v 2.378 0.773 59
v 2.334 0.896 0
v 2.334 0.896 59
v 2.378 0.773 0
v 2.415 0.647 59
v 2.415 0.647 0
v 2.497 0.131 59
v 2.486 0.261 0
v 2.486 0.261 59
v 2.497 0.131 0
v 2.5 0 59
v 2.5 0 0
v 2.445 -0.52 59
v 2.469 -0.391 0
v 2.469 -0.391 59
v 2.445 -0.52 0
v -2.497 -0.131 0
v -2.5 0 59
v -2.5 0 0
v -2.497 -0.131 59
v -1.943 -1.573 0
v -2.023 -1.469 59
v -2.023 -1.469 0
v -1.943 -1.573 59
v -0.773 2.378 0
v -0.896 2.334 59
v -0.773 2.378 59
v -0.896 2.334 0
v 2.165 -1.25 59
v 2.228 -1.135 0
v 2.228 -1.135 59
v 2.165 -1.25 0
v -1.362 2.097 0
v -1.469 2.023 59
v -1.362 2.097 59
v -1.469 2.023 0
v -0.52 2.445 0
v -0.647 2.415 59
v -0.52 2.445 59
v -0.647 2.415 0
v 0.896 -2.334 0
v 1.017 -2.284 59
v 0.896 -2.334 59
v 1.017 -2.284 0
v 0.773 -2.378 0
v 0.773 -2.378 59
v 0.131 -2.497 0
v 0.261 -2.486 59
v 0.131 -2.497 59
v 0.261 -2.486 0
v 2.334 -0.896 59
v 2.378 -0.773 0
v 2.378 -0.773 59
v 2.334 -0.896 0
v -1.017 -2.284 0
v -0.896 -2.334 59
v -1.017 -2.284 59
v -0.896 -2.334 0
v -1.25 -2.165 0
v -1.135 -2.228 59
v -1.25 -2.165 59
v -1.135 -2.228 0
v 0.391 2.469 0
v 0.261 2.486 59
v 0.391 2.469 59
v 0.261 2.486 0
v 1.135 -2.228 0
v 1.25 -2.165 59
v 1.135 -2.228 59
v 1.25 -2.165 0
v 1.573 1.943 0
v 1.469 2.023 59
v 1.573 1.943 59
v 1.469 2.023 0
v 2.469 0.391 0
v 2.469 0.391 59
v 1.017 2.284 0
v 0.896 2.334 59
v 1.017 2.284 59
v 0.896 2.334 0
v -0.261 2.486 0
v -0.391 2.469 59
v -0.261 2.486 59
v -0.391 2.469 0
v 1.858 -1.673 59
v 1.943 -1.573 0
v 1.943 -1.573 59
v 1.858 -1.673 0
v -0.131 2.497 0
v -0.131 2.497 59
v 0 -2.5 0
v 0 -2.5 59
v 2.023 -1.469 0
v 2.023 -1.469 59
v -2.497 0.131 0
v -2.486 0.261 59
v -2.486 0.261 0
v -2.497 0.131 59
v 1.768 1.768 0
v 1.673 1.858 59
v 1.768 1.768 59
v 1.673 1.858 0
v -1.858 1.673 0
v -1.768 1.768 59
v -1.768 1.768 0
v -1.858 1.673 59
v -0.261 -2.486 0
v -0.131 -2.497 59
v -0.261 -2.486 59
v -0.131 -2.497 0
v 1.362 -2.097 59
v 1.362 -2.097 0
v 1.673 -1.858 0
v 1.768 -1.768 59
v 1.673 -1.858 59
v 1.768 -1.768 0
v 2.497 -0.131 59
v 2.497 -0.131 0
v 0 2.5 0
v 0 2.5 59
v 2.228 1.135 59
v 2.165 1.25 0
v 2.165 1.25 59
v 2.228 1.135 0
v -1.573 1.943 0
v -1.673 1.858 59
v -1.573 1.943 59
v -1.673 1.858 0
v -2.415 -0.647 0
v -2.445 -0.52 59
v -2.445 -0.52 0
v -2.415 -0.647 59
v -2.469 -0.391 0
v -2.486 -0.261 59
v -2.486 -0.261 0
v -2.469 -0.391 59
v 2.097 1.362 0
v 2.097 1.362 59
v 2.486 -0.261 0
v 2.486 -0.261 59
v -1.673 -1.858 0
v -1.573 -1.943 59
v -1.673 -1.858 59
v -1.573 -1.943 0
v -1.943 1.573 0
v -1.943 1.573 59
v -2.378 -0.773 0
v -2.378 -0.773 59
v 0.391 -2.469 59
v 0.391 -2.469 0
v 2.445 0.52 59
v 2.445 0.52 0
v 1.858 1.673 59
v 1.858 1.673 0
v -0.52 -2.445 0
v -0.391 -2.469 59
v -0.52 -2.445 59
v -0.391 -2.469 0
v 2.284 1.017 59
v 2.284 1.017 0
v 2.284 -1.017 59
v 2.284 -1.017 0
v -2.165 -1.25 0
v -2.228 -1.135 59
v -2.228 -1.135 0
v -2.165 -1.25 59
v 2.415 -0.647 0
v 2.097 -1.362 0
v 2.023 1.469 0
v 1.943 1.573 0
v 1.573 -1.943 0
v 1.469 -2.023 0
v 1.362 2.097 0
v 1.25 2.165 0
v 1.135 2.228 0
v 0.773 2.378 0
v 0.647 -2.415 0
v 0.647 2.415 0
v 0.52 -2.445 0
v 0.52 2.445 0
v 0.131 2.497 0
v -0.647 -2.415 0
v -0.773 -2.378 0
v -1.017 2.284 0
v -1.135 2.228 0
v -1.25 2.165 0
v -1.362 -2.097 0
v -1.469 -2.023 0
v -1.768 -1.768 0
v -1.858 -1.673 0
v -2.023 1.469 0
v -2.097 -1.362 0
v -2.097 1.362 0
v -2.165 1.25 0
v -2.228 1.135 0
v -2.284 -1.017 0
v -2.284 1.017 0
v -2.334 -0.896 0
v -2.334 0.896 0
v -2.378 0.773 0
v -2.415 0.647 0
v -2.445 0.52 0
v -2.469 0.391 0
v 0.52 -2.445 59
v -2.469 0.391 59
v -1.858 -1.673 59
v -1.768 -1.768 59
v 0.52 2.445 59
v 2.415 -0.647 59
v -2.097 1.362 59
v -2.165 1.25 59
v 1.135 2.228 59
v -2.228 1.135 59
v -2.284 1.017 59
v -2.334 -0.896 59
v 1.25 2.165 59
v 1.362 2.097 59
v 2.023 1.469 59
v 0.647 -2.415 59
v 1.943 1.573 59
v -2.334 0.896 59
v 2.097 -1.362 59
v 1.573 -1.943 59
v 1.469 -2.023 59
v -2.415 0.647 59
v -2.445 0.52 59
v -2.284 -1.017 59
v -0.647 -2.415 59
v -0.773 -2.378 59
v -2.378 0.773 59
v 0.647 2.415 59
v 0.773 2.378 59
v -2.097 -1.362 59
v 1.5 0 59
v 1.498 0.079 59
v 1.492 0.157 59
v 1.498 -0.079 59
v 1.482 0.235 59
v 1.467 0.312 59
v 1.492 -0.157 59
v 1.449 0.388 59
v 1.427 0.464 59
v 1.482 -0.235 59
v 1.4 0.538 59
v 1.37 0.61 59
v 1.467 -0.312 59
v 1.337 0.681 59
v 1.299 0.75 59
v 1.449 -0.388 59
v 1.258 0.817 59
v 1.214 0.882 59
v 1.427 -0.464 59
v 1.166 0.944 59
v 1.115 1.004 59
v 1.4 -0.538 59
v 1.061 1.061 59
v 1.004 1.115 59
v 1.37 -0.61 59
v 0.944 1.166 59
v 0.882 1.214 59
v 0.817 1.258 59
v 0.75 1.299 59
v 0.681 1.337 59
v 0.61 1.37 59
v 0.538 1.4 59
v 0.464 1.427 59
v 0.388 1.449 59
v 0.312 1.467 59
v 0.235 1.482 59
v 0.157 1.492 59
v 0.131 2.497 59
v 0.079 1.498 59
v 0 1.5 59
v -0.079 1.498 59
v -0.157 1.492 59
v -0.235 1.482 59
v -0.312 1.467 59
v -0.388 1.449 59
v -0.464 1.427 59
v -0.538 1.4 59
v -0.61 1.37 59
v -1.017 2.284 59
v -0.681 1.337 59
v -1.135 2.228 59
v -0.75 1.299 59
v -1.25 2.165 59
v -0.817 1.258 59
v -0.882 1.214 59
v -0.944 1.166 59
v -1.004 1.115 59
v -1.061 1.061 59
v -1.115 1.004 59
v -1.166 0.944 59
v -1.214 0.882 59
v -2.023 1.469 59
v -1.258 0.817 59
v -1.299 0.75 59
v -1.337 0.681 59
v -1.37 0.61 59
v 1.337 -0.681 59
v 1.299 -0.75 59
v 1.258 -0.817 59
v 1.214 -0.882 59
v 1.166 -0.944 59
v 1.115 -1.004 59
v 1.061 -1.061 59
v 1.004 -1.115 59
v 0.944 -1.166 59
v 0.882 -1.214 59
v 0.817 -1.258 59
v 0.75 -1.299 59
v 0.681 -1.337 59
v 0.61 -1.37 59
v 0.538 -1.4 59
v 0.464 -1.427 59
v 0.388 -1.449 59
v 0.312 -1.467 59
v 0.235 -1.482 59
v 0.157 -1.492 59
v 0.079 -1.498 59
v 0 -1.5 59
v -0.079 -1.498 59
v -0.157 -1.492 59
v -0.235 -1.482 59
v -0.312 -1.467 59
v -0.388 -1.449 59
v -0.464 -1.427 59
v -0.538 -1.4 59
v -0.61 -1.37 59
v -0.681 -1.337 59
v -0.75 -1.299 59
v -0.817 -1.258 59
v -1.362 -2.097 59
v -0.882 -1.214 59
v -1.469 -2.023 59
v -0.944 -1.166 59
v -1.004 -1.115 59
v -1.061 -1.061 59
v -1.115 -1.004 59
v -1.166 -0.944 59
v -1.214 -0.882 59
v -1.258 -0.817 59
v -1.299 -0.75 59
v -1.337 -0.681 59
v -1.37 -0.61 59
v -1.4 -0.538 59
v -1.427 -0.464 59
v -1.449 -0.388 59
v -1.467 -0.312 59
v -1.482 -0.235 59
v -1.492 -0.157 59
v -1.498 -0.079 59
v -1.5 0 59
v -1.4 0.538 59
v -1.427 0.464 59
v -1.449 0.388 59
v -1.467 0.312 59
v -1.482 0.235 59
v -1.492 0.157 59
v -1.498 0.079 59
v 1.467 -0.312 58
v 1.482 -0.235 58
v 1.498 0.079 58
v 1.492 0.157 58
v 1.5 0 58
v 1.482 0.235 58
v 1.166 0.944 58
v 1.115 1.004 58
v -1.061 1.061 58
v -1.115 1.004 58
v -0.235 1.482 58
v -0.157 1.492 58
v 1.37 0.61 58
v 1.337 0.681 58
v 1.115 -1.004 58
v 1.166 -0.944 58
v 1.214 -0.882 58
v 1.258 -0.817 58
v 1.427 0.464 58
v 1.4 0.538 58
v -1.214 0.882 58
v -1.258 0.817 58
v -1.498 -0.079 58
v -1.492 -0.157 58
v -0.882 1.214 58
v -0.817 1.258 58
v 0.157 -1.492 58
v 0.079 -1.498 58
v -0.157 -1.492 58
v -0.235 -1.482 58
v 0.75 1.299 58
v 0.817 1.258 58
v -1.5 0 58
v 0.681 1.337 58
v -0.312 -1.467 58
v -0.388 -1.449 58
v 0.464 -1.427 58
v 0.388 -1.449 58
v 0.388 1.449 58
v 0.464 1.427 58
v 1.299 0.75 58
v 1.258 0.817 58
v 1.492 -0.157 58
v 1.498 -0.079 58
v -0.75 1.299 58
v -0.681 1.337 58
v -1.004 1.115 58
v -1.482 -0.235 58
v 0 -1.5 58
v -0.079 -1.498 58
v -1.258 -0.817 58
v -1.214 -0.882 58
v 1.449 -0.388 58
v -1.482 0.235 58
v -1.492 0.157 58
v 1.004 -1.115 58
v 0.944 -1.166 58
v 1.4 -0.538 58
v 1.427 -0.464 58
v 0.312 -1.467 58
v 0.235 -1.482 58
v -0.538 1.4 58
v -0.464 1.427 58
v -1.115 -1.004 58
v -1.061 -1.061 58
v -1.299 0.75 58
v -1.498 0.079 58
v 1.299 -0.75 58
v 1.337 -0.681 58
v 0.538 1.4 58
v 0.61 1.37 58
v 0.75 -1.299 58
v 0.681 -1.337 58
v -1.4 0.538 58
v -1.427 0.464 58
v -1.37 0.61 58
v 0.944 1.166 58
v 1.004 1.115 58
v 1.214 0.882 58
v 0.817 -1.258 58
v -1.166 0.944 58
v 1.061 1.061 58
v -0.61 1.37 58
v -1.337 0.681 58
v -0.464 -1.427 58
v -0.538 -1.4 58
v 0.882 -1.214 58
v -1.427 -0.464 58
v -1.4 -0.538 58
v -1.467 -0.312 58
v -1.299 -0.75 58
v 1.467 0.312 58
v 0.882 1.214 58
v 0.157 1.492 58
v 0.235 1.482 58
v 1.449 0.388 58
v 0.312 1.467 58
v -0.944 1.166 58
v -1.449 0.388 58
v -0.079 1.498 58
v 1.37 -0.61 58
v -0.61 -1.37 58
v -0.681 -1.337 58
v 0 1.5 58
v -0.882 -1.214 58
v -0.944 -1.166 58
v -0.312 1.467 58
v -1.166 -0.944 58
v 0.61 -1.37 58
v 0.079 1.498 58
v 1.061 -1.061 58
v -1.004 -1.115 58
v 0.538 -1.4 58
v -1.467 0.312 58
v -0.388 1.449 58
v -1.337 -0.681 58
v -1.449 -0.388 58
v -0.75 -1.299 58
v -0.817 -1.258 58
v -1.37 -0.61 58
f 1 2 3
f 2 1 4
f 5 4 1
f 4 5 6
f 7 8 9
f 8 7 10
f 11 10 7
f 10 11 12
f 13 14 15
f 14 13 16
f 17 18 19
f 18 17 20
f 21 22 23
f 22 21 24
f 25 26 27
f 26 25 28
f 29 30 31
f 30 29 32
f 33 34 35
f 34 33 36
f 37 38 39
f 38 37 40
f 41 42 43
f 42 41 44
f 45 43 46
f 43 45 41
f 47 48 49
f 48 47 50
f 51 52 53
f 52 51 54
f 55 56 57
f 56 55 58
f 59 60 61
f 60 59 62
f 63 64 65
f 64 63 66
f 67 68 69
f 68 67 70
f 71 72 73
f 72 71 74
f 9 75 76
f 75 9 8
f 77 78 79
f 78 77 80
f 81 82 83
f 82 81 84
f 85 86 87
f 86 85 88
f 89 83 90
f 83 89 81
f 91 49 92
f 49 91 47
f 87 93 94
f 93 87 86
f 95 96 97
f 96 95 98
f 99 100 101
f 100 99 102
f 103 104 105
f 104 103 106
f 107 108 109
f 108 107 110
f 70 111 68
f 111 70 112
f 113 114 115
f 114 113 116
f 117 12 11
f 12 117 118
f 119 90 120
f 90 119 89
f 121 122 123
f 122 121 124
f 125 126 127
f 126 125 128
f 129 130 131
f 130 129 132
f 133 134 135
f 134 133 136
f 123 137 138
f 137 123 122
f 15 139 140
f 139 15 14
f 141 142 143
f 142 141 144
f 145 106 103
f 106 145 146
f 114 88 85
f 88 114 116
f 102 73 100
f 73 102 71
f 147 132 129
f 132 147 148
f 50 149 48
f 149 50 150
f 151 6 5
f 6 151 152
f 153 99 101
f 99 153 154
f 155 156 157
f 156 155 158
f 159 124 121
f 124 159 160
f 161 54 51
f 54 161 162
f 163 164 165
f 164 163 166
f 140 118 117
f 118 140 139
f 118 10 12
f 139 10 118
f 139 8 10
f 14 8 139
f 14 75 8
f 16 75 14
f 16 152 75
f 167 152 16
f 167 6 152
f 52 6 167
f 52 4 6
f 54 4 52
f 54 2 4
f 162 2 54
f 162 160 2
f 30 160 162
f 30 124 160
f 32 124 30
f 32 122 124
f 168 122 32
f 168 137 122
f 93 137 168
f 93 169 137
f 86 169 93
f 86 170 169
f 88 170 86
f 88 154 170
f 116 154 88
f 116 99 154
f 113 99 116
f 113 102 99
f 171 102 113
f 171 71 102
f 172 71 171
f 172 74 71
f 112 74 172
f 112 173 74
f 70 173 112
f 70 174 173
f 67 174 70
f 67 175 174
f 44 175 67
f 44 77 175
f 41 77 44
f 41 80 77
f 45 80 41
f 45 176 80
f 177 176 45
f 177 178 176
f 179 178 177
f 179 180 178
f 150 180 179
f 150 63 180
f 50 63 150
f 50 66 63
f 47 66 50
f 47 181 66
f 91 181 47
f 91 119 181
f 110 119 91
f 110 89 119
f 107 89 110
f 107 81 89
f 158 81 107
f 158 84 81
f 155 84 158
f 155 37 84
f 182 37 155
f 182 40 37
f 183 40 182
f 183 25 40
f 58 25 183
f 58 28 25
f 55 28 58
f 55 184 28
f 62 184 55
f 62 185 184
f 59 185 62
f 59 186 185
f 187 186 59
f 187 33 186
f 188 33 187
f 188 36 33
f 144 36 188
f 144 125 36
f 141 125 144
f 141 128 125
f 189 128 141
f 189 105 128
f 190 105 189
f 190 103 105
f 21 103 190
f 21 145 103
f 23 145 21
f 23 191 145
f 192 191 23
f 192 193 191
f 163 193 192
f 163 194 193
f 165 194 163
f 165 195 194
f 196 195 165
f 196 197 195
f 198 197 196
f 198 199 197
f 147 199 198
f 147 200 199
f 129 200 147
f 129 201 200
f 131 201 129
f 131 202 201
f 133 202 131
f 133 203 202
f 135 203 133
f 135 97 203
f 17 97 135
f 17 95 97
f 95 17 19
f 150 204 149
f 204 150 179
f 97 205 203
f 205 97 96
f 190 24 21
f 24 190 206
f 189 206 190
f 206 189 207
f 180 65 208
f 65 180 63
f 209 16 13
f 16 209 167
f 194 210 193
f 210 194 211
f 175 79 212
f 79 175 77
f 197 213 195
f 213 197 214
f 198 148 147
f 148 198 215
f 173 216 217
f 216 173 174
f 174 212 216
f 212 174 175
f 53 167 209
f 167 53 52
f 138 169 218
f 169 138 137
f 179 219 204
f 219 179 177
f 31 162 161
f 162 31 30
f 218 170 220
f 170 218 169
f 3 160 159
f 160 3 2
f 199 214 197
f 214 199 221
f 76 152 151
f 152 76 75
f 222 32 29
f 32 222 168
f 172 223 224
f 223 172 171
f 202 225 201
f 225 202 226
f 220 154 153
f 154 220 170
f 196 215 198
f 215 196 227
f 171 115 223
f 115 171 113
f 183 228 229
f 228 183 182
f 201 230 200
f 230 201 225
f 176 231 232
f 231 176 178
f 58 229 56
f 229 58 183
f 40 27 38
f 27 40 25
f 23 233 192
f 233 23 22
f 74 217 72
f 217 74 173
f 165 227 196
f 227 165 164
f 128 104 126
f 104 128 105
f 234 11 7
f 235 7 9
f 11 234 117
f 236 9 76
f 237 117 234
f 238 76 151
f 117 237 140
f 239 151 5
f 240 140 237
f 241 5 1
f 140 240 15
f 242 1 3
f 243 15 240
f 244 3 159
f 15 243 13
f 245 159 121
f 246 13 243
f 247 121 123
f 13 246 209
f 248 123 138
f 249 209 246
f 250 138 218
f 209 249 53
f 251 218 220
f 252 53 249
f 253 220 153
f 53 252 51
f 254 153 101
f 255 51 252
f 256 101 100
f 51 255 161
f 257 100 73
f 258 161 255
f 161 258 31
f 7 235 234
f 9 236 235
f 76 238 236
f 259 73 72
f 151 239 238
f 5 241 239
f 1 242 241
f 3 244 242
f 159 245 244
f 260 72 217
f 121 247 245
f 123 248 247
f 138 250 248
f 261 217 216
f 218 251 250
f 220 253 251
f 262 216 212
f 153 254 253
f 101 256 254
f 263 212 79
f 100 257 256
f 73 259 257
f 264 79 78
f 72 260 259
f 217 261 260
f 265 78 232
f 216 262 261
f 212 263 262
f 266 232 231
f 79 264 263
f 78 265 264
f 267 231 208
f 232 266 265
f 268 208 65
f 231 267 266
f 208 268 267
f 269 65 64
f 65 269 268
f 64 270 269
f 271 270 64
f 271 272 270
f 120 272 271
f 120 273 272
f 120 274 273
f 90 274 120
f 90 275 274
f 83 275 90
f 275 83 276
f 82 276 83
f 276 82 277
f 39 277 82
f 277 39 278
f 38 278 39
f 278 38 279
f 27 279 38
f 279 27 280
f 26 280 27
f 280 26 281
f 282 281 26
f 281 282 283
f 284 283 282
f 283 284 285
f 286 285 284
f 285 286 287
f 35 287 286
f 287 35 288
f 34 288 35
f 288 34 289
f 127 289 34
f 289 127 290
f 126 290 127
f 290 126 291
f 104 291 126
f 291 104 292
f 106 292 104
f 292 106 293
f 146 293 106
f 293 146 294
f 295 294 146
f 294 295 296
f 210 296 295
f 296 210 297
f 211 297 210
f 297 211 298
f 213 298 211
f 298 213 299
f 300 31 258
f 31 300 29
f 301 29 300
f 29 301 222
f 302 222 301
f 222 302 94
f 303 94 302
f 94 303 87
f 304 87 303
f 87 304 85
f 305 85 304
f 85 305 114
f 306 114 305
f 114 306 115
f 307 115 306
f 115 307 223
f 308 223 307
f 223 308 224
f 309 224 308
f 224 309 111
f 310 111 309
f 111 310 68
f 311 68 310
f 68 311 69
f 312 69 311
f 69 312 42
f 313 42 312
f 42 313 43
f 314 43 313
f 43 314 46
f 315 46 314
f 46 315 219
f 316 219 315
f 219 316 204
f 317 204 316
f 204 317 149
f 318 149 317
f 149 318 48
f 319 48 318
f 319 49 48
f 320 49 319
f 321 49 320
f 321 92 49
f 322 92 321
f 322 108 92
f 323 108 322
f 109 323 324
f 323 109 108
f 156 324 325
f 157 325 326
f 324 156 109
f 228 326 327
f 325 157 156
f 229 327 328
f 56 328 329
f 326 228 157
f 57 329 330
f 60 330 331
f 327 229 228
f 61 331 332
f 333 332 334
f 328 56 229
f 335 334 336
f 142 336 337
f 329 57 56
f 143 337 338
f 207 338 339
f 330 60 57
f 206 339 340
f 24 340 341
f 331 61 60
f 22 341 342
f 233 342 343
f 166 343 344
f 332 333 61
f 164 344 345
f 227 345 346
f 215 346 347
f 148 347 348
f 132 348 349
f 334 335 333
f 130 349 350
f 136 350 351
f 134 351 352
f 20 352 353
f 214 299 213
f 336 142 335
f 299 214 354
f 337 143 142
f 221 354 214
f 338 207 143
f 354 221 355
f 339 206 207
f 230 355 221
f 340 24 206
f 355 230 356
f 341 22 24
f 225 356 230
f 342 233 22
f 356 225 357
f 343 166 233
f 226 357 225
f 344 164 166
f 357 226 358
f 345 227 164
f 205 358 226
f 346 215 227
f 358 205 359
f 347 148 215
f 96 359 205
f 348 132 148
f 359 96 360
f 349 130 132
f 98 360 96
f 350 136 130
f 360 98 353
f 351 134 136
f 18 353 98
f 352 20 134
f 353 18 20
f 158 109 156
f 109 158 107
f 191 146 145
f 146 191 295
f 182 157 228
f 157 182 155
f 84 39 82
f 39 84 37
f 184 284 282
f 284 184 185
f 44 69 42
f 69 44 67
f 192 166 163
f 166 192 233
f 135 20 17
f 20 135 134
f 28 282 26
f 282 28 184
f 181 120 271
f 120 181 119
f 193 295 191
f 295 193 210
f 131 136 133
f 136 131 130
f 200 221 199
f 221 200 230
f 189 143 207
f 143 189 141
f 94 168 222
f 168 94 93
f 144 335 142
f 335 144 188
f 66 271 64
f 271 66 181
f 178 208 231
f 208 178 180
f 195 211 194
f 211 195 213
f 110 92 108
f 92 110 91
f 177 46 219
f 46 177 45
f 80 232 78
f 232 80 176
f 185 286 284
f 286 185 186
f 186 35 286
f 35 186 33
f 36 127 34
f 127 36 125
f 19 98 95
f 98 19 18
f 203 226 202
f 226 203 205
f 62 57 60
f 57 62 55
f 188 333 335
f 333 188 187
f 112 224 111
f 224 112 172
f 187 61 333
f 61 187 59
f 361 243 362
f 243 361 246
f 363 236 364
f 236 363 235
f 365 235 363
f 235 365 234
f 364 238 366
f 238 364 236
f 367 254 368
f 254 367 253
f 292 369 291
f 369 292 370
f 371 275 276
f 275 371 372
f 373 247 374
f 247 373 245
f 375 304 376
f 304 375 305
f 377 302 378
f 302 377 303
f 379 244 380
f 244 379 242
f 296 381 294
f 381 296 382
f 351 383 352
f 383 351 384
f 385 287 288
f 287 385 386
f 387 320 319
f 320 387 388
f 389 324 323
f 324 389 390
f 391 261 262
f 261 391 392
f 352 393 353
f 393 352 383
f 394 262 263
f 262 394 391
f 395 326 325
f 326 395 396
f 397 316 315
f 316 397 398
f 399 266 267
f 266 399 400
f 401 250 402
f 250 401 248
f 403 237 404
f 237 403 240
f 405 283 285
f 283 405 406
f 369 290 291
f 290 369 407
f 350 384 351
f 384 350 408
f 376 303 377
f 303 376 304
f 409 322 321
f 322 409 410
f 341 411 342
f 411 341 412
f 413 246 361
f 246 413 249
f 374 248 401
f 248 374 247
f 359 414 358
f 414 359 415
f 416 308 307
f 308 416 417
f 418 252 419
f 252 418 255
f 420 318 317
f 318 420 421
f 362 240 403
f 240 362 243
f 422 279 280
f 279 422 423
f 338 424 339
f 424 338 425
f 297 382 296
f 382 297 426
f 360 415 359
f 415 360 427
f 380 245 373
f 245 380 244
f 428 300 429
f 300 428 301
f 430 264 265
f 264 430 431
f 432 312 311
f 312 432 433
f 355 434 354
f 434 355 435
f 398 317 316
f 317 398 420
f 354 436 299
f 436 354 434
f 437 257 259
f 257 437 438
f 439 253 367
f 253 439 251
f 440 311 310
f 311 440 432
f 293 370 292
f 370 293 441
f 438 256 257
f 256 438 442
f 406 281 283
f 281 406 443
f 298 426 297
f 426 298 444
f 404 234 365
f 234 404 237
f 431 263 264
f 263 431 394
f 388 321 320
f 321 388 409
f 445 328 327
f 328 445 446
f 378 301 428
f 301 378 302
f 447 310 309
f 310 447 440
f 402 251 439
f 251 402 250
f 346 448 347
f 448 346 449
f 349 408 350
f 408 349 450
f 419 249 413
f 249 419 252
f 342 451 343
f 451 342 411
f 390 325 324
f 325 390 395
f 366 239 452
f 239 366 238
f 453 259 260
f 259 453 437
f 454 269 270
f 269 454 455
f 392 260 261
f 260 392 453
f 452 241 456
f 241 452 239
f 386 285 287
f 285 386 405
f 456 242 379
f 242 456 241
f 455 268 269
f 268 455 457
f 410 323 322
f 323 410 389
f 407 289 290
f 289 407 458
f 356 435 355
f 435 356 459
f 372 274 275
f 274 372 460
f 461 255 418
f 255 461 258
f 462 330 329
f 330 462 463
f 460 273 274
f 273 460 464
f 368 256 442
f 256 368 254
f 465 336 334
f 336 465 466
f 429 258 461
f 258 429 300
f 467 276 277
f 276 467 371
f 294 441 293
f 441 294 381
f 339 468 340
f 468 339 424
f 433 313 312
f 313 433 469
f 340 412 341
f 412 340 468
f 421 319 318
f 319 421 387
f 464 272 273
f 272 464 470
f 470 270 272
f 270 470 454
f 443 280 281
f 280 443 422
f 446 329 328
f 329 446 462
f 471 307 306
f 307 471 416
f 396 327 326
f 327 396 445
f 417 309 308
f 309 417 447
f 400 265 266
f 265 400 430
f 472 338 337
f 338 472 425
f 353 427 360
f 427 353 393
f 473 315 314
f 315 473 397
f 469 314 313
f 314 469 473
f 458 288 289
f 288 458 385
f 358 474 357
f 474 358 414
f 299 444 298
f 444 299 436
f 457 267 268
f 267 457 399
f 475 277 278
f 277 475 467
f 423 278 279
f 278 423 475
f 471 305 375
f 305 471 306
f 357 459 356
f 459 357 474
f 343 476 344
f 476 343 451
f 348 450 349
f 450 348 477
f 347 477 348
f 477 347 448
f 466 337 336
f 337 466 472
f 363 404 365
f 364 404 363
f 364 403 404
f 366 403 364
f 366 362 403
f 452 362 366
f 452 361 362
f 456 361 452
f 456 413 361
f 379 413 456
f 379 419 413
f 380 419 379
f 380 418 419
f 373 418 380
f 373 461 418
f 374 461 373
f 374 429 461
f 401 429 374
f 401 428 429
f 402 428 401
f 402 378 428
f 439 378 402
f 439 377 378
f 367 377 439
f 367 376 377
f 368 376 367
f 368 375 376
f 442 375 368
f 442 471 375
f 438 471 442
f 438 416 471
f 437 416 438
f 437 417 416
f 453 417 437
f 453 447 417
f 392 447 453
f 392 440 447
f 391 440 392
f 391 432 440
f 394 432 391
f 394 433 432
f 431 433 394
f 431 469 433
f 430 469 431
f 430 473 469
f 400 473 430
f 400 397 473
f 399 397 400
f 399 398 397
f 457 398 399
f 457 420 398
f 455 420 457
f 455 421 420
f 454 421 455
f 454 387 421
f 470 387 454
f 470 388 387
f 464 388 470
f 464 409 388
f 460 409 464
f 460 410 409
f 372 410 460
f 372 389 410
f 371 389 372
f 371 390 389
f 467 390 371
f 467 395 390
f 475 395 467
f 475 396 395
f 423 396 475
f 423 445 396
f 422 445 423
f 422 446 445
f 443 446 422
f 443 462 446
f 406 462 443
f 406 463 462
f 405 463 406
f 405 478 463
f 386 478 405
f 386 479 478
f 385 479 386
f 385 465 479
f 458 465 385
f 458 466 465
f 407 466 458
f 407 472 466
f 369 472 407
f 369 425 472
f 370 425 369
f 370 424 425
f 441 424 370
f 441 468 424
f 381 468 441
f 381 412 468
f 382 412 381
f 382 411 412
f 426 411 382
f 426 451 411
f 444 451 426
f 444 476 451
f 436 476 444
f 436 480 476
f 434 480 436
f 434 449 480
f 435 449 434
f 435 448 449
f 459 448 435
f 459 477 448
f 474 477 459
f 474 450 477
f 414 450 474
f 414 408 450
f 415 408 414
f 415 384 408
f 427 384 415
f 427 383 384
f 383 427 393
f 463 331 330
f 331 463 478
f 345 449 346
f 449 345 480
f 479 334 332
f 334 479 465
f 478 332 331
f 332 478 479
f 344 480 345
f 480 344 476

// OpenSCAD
// ==========================================================================
//  GENERATED FILE -- DO NOT EDIT.
//  Produced by build/build.py from components/Bottle_Sail_Shaft.scad
//  Turtle Body version 6.7.4
//  Edit lib/ and src/ instead, then run: python3 build/build.py
// ==========================================================================
/*
 Hope Turtle — uniform round centre sail shaft. Units: mm. License: CERN-OHL-S-2.0.
 TB-08: one uniform round bar top to bottom, no hex section. Free-spins in
 the cap bore; passes with a light running clearance through the cage hub
 and the top sail bar's own hole; locks to the rotating cage with a single
 M3 set screw through the cage hub (see Bottle_Control_Cage.scad).
 Upper end on Z=0 for printing; the magnet recess opens upward.
 v6.4.0: the real shaft is an Ø5 steel rod; this file now just gives its
 cut length and magnet-recess position. Round-in-cap section = 30 mm inside the cavity (incl. boss) + 5 mm cap roof
 (TB-03) + 1 mm proud. Overall length 59 mm.

 SOURCE FILE — geometry lives in lib/sail_shaft.scad + lib/params.scad.
 The committed self-contained file is generated by build/build.py.
*/

/* [Shaft] */
shaft_diameter = 5;  // v6.4.0: Ø5 steel rod (was an Ø8 printed PLA shaft) -- this model is now
                     // the cut-length / magnet-recess reference, not a print
round_length_inside_cap = 30; // roof underside -> lower end, INCLUDING the boss
round_extension_above_cap = 1;
upper_length = 23; // continues up through the cage hub + sail bar

/* [Magnet recess] */
magnet_recess_enabled = true;
magnet_diameter = 3;
magnet_thickness = 1;

/* [Render] */
fn = 120; // [48:8:240]

// [bundle] begin use <../../lib/sail_shaft.scad>
// ==========================================================================
//  Turtle Body -- sail shaft: uniform round centre axle  (lib module)
// --------------------------------------------------------------------------
//  TB-08: one uniform round bar top to bottom -- no hex section. The lower
//  (round_inside_cap) portion bears/free-spins in the cap's bore; the upper
//  portion continues on up through the cage hub and the top sail bar's own
//  hole with a light running clearance (p_axle_shaft_hole_d()) and is
//  locked to the ROTATING cage by a single radial M3 set screw through the
//  cage hub (see lib/control_cage.scad) instead of a shaped interference
//  fit. Magnet recess opens at the round/lower end for an AS5600 sensing
//  magnet. See CLAUDE.md s9.
//
//  TB-04: derived to the resolved 5 mm cap roof (TB-03). round_inside_cap
//  spans roof underside -> round end, 30 mm, INCLUDING the boss -- do not
//  add the boss again -- + the 5 mm roof + 1 mm proud, so the shaft's
//  lower end still sits 1 mm above the cap's outer face and the overall
//  shaft is 59 mm.
//
//  Definitions only. Geometry is emitted by sail_shaft().
// ==========================================================================

// [bundle] begin use <params.scad>
// ==========================================================================
//  Turtle Body -- shared dimension contract
// --------------------------------------------------------------------------
//  The single source of truth for every dimension that more than one
//  subsystem depends on. Values are exposed as zero-argument functions so
//  this file can be pulled in with `use <params.scad>` (which ignores
//  top-level variable assignments) without polluting any namespace.
//
//  lib/ modules take these as DEFAULT argument values:
//      module control_cap(roof_t = p_cap_roof_t(), ...) { ... }
//  so a src/ wrapper can still override one value from its customizer block
//  while every other subsystem keeps the shared number.
//
//  Rules:
//   * one function per concept, canonical name (see CLAUDE.md cross-file table)
//   * derived values are functions of other p_*() functions, never re-typed
//   * mm throughout; names say _d (diameter), _r (radius), _t (thickness),
//     _len / _h (axial), _af (hex across-flats)
//   * do NOT add a bare `x = ...;` here -- bundle.py / lint.py will reject it
// ==========================================================================

// ---- tolerances and render quality --------------------------------------
function p_eps()          = 0.02;   // Boolean overlap / cut-through fudge
function p_fit_clearance() = 0.2;   // wood joint: TOTAL extra slot width, centred on the board
function p_fn_plastic()   = 120;    // printed PLA parts (cap, cage, axle, mold)
function p_fn_wood()      = 96;     // cut wooden parts
function p_fn_curve()     = 180;    // fine profile curves (bottle, sails)

// ---- bottle (the foundation reference) ---------------------------------
function p_bottle_d()        = 84;    // outside diameter (was 86, and 82 before that; other bottle dims held)
function p_bottle_h()        = 305;   // total height incl. ordinary screw cap
function p_bottle_wall_t()   = 0.5;   // modelling assumption, not a measurement
function p_bottle_cap_d()    = 31;    // ordinary screw cap (NOT the control-cap disk)
function p_bottle_cap_h()    = 17;    // ordinary screw cap height (rear-fin / ballast formulas)
function p_collar_d()        = 34;    // bottle collar, independent of cap diameter
function p_top_dome_h()      = 62;
function p_bottom_dome_h()   = 25;
function p_dome_power()      = 2.5;   // superellipse exponent
function p_bottle_neck_h()   = 5;
function p_bottle_collar_h() = 1;
function p_bottle_neck_d()   = p_bottle_cap_d() - 3;   // 28: neck is 3 mm under the cap
function p_bottle_base_ratio() = 0.88; // slightly narrower footprint at the base
function p_bottle_profile_steps() = 16;
// cut bottle (control head): the lower dome is removed and a short socket is
// bored so the control-cap insert slides in. Cut plane sits 5 mm above the
// bottom dome height.
function p_bottle_cut_extra()  = 5;
function p_bottle_cut_height() = p_bottom_dome_h() + p_bottle_cut_extra();   // 30

// nominal bottle interior and the cap insert that enters it
function p_bottle_socket_d() = p_bottle_d() - 2 * p_bottle_wall_t();          // 81
function p_insert_shaft_radial_clearance() = 1;
function p_insert_shaft_d()  = p_bottle_socket_d()
                             - 2 * p_insert_shaft_radial_clearance();          // 79

// ---- wooden stock -----------------------------------------------------
function p_wood_t()          = 12;    // shared board / slat thickness
function p_fin_board_w()     = 93;    // shared fin-system stock width
function p_screw_side_offset() = 17;  // mounting-hole inset from a John end (was 25 until v4.2.0)

// ---- Ecojoiner port --------------------------------------------------
// A port must swallow the bottle's tapered top (the top dome) plus a seating
// allowance, so its axial length is DERIVED from the bottle, not fixed. This
// is the same rule the HopeTurtles.org generators use
// (port_length = taper_height + port_allowance); until 2026-09-08 lib carried
// the evaluated constant 82 instead, which silently broke the rule for any
// bottle other than the reference one. Ballast and Ecojoiner both read it.
function p_port_allowance()  = 20;                 // seating allowance beyond the dome
function p_port_length()     = p_top_dome_h() + p_port_allowance();   // 62 + 20 = 82
function p_port_height()     = p_bottle_d();       // opening height == bottle diameter (asserted)

// ---- M6 hardware ---------------------------------------------------
function p_m6_clearance_d()  = 6.4;   // M6 clearance hole
function p_m6_bolt_shaft_d() = 6;     // visual placeholder only
function p_m6_bolt_head_d()  = 12;
function p_m6_bolt_head_t()  = 4;

// ---- Ecojoiner bottle clamp: M5 cap screws + acorn nuts (v5.0.0/v5.1.0) --
// Replaces the M6 bolt + 12 mm presser disk. Each John port end carries TWO
// black M5 x 30 socket-head cap screws, stacked across the John height (one
// above, one below the centreline). v5.1.0: no nut -- each screw BITES into
// a 5.2 mm hole in the wood (builder's research; not verified here), so the
// screw itself holds its position and is adjusted with a hex key from
// outside. A black acorn (cap) nut, run fully onto the tip, bears on the
// bottle. Hardware sizes are ISO 4762 / DIN 1587 nominals for visual and
// stack checks only -- measure the hardware you buy.
// Bite-fit hole (was 5.5 clearance in v5.0.0). NOTE it is slightly LARGER
// than the 5 mm nominal major diameter: the hold relies on wood fibre
// springback around the thread, per the builder's own tests -- unverified
// here, and likely to vary with species, moisture and drill quality.
function p_m5_hole_d()           = 5.2;
function p_m5_bolt_d()           = 5;     // visual shank (plain cylinder)
function p_m5_bolt_len()         = 30;    // shank length under the head
function p_m5_head_d()           = 8.5;   // ISO 4762 socket head
function p_m5_head_h()           = 5;
function p_m5_acorn_af()         = 8;
function p_m5_acorn_h()          = 10;    // overall, hex base to dome tip
function p_m5_acorn_thread_depth() = 7;   // usable thread before the bolt bottoms
// Pair layout, shared by the John holes and every board bolted through them
// (rear-fin shafts, ballast core slats): each bolt sits this far in from a
// John long edge, i.e. +-p_eco_screw_pair_offset() from the John centreline.
function p_eco_screw_edge_inset()  = 12;   // was 10 until v5.2.0
function p_eco_screw_pair_offset() =
    (p_port_height() - 2 * p_wood_t()) / 2 - p_eco_screw_edge_inset();   // 18

// ---- pressor (EXPERIMENTAL, v6.6.1; lib/pressor.scad, CLAUDE.md s13a) ----
//  A board block in the port gap between a Little John and the bottle,
//  concave-cut to the bottle radius. The John's M5 pair passes into two
//  plain clearance holes in its back edge and pushes it onto the bottle as
//  the screws are turned in -- replaces the acorn nut. Two per port, one
//  each side of the bottle.
function p_pressor_t()          = 15;    // v6.7.4: pressor board thickness (along the bottle axis);
                                          // its own stock, the Johns stay on p_wood_t() 12
function p_pressor_wrap()       = p_bottle_d() / 4;  // 21: inner edge reaches this far past the
                                                      // bottle's tangent line, toward its axis
function p_pressor_travel()     = 1;     // screw-in travel: gap left at the John face when pressed
function p_pressor_hole_d()     = 6;     // v6.7.4: plain Ø6 clearance hole for the John's M5 screw
                                          // (was a 5.3 x 25.3 pill slot; the Johns keep p_m5_hole_d() 5.2)
function p_pressor_hole_depth() = 8;     // hole depth into the pressor's back edge (v6.6.4: was 10)
function p_pressor_min_wall()   = 3;     // least wood around / beyond a screw hole (asserted)
function p_pressor_end_trim()   = 1.5;   // v6.6.4: taken off EACH end (top/bottom edge) -- the printed
                                          // prototype was 3 mm too long to enter the port

// ---- control cap (large stationary disk; see CLAUDE.md s7) ----------
//  TB-03 resolution: repository 5 mm roof / 2 mm boss is authoritative;
//  the axle (below) is derived to this datum.
function p_cap_disk_d()      = 102;   // control-cap disk (independent of p_bottle_cap_d; was 100, +2 mm)
function p_cap_roof_t()      = 5;     // disk / roof thickness
function p_cap_boss_depth()  = 0;     // extra projection of the centre boss into the hollow cap.
                                       // 0 = no boss, flat cavity ceiling (v6.5.1; was 1.5, before that 2)
function p_cap_boss_d()      = 18;
function p_cap_insert_len()  = 35;    // straight insert shaft length
function p_cap_insert_wall_t() = 4;
function p_cap_entry_chamfer_h()     = 1;
function p_cap_entry_chamfer_delta() = 1;
function p_cap_axle_bore_d() = 6;     // loose: 0.5 mm radial clearance to the Ø5 steel shaft (was 8.7 for Ø8 PLA)
function p_cap_cage_radial_clearance() = 1;   // cap disk -> cage inner wall (radial)
function p_cap_total_h()     = p_cap_roof_t() + p_cap_insert_len();           // 40
function p_cap_bearing_len() = p_cap_roof_t() + p_cap_boss_depth();           // 5 (was 6.5, 7)

// buttons (through both cap and cage)
function p_button_upper_d()  = 17;    // clearance hole in the cap
function p_button_axis()     = "y";   // "x" or "y"
function p_button_radius()   = 25;    // radial position of the two button centres (50 mm apart;
                                       // was 24 / 48 mm -- shared with the cage's matching bore)

// ---- silicone seal grooves + rings (CLAUDE.md s8) ------------------
function p_seal_groove_count()      = 2;
function p_seal_groove_axial_h()    = 2.7; // groove height (was 3.5; retuned to just clear
                                            // the 2.6 mm ring axial thickness below, 0.1 mm margin)
function p_seal_groove_radial_depth() = 2; // groove depth
function p_seal_groove1_from_shoulder() = 12;  // groove centre, measured from the insert SHOULDER
function p_seal_groove2_from_shoulder() = 25;
function p_seal_ring_axial_t()      = 2.6;  // cast ring thickness (was 3)
function p_seal_ring_radial_w()     = 10;   // cast ring radial width (was 5; doubled). NOT validated.
function p_seal_ring_elasticity_reduction() = 0.25;
    // Cast the ring's inner diameter this fraction SMALLER than the groove
    // root it mates to, so real (stretchy) silicone is under tension --
    // and therefore actually grips -- once stretched onto the cap, instead
    // of sitting at a 1:1 as-cast fit. Tweak this here as real silicone
    // behaviour is characterized; NOT validated (see lib/silicone_ring_mold.scad).
function p_seal_groove_root_d() = p_insert_shaft_d()
                                - 2 * p_seal_groove_radial_depth();            // 79 at the 86 mm bottle

// ---- sail shaft: uniform round centre axle (CLAUDE.md s9) ----------
//  Derived to the 5/2 cap datum (TB-03/TB-04). round_inside_cap is measured
//  from the roof underside and INCLUDES the boss -- do not add the boss again.
//  TB-08: the shaft is now one uniform round bar top to bottom -- no hex
//  section. It free-spins in the cap bore (p_cap_axle_bore_d) and passes
//  with a light running clearance through the cage hub bore and the top
//  sail bar's own hole (both p_axle_shaft_hole_d()); it locks to the
//  ROTATING cage with a single M3 set screw through the cage hub
//  (p_cage_setscrew_pilot_d()) rather than a shaped (hex) interference fit.
function p_axle_round_d()        = 5;    // Ø5 steel rod (v6.4.0; was an Ø8 printed PLA shaft)
function p_axle_round_ext()      = 1;    // projection above the cap's outer face
function p_axle_round_inside_cap() = p_cap_insert_len() - 5;  // 30: roof underside to round end (incl. boss)
function p_axle_round_len()      = p_axle_round_inside_cap() + p_cap_roof_t() + p_axle_round_ext();  // 36
function p_axle_upper_len()      = 23;   // continues up through the cage hub + sail bar (was the hex length)
function p_axle_total_len()      = p_axle_upper_len() + p_axle_round_len();
function p_axle_shaft_clearance() = 0.4; // snug fit, diametral (was 0.2 on the Ø8 shaft): any hole the shaft passes
                                          // (but does not bear in) is p_axle_round_d() + this
function p_axle_shaft_hole_d()   = p_axle_round_d() + p_axle_shaft_clearance();  // 5.4 (cage hub bore)
function p_magnet_d()            = 3;    // AS5600 sensing magnet recess
function p_magnet_t()            = 1;

// ---- axle rotary shaft O-ring (waterproofs the axle bore; cast in the mold) ----
//  A round-section O-ring seated in a gland in the control-cap bore, sealing
//  against the spinning round section of the axle. ID is tied to the shaft.
function p_axle_oring_cs()     = 2.0;                                   // cross-section
function p_axle_oring_id()     = p_axle_round_d();                      // 5 -- hugs the shaft
function p_axle_oring_od()     = p_axle_oring_id() + 2 * p_axle_oring_cs();          // 9
function p_axle_oring_mean_r() = (p_axle_oring_id() + p_axle_oring_cs()) / 2;        // 3.5
//  gland cut into the cap bore for it
function p_cap_oring_squeeze()      = 0.25;  // radial squeeze on the seal
function p_cap_oring_gland_od()     = p_axle_oring_od() - 2 * p_cap_oring_squeeze(); // 8.5
function p_cap_oring_gland_w()      = 1.3 * p_axle_oring_cs();                       // 2.6 axial
function p_cap_oring_gland_from_face() = p_cap_bearing_len() / 2; // gland centre, from the cap outer face, along the bore
                                         // (2.5 = mid-roof since the boss went in v6.5.1; was 3.5)

// ---- rotating control cage (CLAUDE.md s6) ------------------------
function p_cage_wall_t()     = 6.5;   // radial wall thickness
function p_cage_roof_t()     = 4;     // roof / surface plate thickness
function p_cage_inner_d()    = p_cap_disk_d() + 2 * p_cap_cage_radial_clearance();   // 102
function p_cage_outer_d()    = p_cage_inner_d() + 2 * p_cage_wall_t();               // 115
function p_cage_skirt_depth()   = 44;   // roof underside to the ORIGINAL skirt rim
function p_cage_peak_extension() = 20;  // crest extends this far past the original rim
function p_cage_valley_wall_h()  = 10;  // minimum wall depth between mounts
function p_cage_total_h()    = p_cage_skirt_depth() + p_cage_roof_t();              // 48 (native)
function p_cage_notch_count()   = 4;
function p_cage_notch_w()    = 22.5;  // batten groove width
function p_cage_notch_depth() = 3.7;
function p_cage_wave_segments() = 240;
function p_cage_hub_d()      = 29;
function p_cage_pocket_d()   = 26;    // top clip pocket (control_cage top_pocket, OFF by default)
function p_cage_pocket_depth() = 4;   //   "        "     "
// TB-08: hex bore replaced by a plain round bore (p_axle_shaft_hole_d(),
// shared with the sail bar) + a radial M3 set screw that locks the cage to
// the shaft -- see p_cage_setscrew_*() below.
function p_cage_bearing_d()  = 9;     // hemispherical bearing bump
function p_cage_bearing_count() = 8;
function p_cage_bearing_pcd() = p_cap_disk_d() - p_cage_bearing_d() + 0.5;          // 91.5
function p_cage_top_hole_d() = 18;    // button / access hole through the roof (v6.5.2: back to 18 from 22;
                                       // the 22 opened onto the hub for set-screw access, off since v6.0.0)
function p_cage_mount_hole_d() = 3.2; // two M3 clearance holes per batten / groove
function p_cage_mount_pitch()  = 32;  // vertical pitch of the pair
function p_cage_lower_hole_from_tip() = 10;
// Single radial M3 set (grub) screw through the hub wall, pressing on the
// shaft to lock cage <-> shaft rotation (TB-08). Self-tapping into the
// printed PLA hub -- not a clearance hole for a separate nut, unlike the
// batten/mount M3 holes above. Pilot diameter is an untested starting
// point (typical M3-into-rigid-plastic self-tap pilots run 2.5-2.8 mm) --
// verify real thread engagement and tapping torque before relying on it.
function p_cage_setscrew_pilot_d() = 2.5;
// v6.0.0: the hub set screw (and its access recess) is switched OFF -- the
// M3 in the sail crossbar connector now clamps the shaft. Kept, not deleted,
// so it can be turned back on.
function p_cage_setscrew_enabled() = false;
// Flat-floored access recess around the set screw, cut into the hub face the
// roof button opening uncovers, running the hub's full height (roof top down
// through the hub bottom). Width is tangential, depth is radial (inward from
// the opening's inner edge).
function p_cage_setscrew_recess_w()     = 5;
function p_cage_setscrew_recess_depth() = 3;
// Set-screw angle is no longer a separate parameter: control_cage() aims it
// at the centre of the roof button opening (button_angle) so a hex key can
// reach it through that opening.
// 45-deg outward chamfer on the roof-top outer edge (0 = sharp). The cage
// prints roof-face-down, so this bevel flares OUT from the bed and stays
// printable; it runs the full perimeter, batten grooves included. See
// lib/control_cage.scad.
function p_cage_roof_bevel() = 3;

// ---- sail apparatus (CLAUDE.md s10) ---------------------------
// SAIL battens. v6.0.0: the upper notch holds two stacked layers (connector
// below, crossbar half above), so the batten grew by the extra layer: 205 +
// 2t (229) at first, trimmed back by t to 205 + t (217) in v6.1.0 so 15 mm of
// batten stands above the notch again. Batten bottom, cage M3 holes and the
// lower rails do not move. The NON-sail battens are shorter: their top is
// flush with the cage roof top (derived in lib/sail_frame.scad, 178 mm).
function p_side_batten_h()   = 205 + p_wood_t();       // 217
function p_side_batten_w()   = 20;
// v6.5.0: battens are cut from the same board as every other slat (were a
// separate 20 x 10 stock), so their radial thickness -- and every slot that
// takes a batten -- is the board thickness.
function p_side_batten_radial_t() = p_wood_t();     // 12 (was 10)
// Top crossbar span, tip to tip: 6 x bottle_d (504). v6.1.0 briefly made each
// half a head-fin-slat length (span 843.6); v6.2.0 reverted it -- the sails
// came out too big. The halves are derived from this span.
function p_top_crossbar_len() = 6 * p_bottle_d();   // 504 (halves 212.2 each)
function p_top_crossbar_w()  = 22;
function p_top_crossbar_t()  = p_wood_t();          // 12
// v6.0.0: the top crossbar is split into a LEFT and RIGHT half plus a
// centre "sail crossbar connector". The connector lies on the cage roof and
// spans between the two sail battens; each half lies on top of it and runs
// out to its tip. Both layers half-lap into the same (now 2t tall) sail-batten
// notch, and one M3 per side screws the half down into the connector.
// The shaft passes the connector with generous clearance (no bearing), and an
// M3 self-tapped in from the connector's side face clamps it, locking frame,
// cage and shaft together (replaces the cage hub set screw).
function p_sail_connector_axle_hole_d()  = 6;     // Ø5 steel shaft, 0.5 mm radial clearance (v6.4.0; was 9 for the Ø8 shaft)
function p_sail_m3_pilot_d()             = 2.8;   // self-tap pilot: clamp screw + the half-to-connector screws
function p_sail_m3_clear_d()             = p_cage_mount_hole_d();   // 3.2, through the top (half) layer
function p_sail_connector_overhang()     = 15;    // connector past each sail batten's outer face
function p_sail_bar_half_inboard()       = 15;    // each half runs this far inboard of its batten
function p_bottom_rail_len() = 3 * p_bottle_d() + p_wood_t();   // 264 (v6.3.0: +t; 252 in v6.2.0, 360 in v6.1.0)
function p_bottom_rail_bottle_clearance() = 1;
function p_sail_rail_color()  = [0.56, 0.39, 0.39]; // brown (top AND bottom rails)
function p_c_piece_color()    = [1.0, 0.52, 0.20];  // orange, retained

// ---- rear fin + solar support (CLAUDE.md s11) ----------------
function p_solar_panel_w() = 148;
function p_solar_panel_h() = 223;
function p_solar_panel_t() = 2.5;    // real panel, independent of wood thickness
// The green shafts overlap the yellow fin over X = 0..p_rear_shaft_rear_x()
// (the half-lap zone, 84 mm). v5.3.0: the bottle base must ABUT the fin's
// front edge (X = 0) so the fin holds the bottle in its port -- previously
// the full turtle seated the bottle base at the shafts' rear end, putting the
// first 84 mm of the fin inside the bottle. The shaft front (and its John
// hole pair) stays where it was, so the shafts grow by exactly that overlap:
//   334 (old approved formula) + 84 = 418.
// v5.7.0: the yellow fin is exactly one board wide (it was board + a 15 mm
// "rear tab", 108 mm -- wider than the 93 mm board it is cut from), so the
// overlap is board width - 2t: 84 -> 69, shaft 418 -> 403, half-lap 42 -> 34.5.
function p_rear_shaft_rear_x() = p_fin_board_w() - 2 * p_wood_t();             // 69
function p_rear_shaft_len() = p_bottle_h()
                            + (2/3) * (p_fin_board_w() - 2 * p_wood_t())
                            - p_bottle_cap_h()
                            + p_rear_shaft_rear_x();                            // 403 (418 v5.3.0-v5.6.0)
function p_rear_half_lap_engagement() = p_rear_shaft_rear_x() / 2;  // 34.5 green/yellow interlock depth
// v5.4.0: the green shaft is as wide as the Ecojoiner John it bolts flush
// against (John height = port height - 2 x stock), so their edges and M5 pair
// line up. Was a fixed 59 -- 1 mm narrower than the 60 mm John, and the M5
// pair (centred on it) sat 11.5 mm in from its edges instead of 12.
function p_rear_shaft_width()   = p_port_height() - 2 * p_wood_t();            // 60
// TB-07: the green-slat mounting hole follows the mating Ecojoiner John, not a
// fixed 50 mm. Derived from the install transform; the john_length/2 terms
// cancel, leaving a pure function of the shared contract (= 113 at defaults).
// v5.3.0: the install now seats the bottle base at fin X = 0 (not at the
// shaft rear, X = p_rear_shaft_rear_x()), so that overlap is subtracted back
// out -- the hole stays 113 mm from the (unmoved) shaft front.
function p_rear_shaft_hole_from_front() =
    p_rear_shaft_len() - p_rear_shaft_rear_x() - p_screw_side_offset()
    - p_bottle_h() + p_bottle_cap_h() + p_port_height();

// ---- head fin: front fin (v5.8.0, EXPERIMENTAL; triangle since v6.3.0) ---------
// The rear fin's mirror on the front (-X / physical 9 o'clock) port: two
// flat slats above and below the front bottle bolt to the same Little John
// M5 pairs and run the length of the bottle; a vertical triangular fin
// half-laps into their outer ends and abuts the bottle base. Not built or
// tested. See lib/head_fin.scad.
//  * fin width (forward, along the bottle axis) = the widest board, so the
//    fin is cut across one board (its height runs along the board's length)
//  * the slats reach exactly as far into the Ecojoiner as the rear shafts,
//    so their M5 pair lands at the same distance from the slat front
function p_head_fin_w()       = p_fin_board_w();                         // 93
function p_head_fin_h()       = p_bottle_d() + 6 * p_wood_t();           // 156: 2t of fin beyond each slat
function p_head_slat_overlap() = 4 * p_wood_t();                         // 48: slat run into the fin
// v6.3.1 profile (v6.3.0 had the slope the other way): the TOP edge runs
// out only to this X (where the slats end); the leading edge slopes down and
// FORWARD from there to a vertical flat "toe" at the full fin width, which
// meets the bottom edge. Full width along the BOTTOM edge.
function p_head_fin_heel_x()  = p_head_slat_overlap();                   // 48: top-edge length
function p_head_fin_toe_h()   = 3 * p_wood_t();                          // 36: vertical flat nose at the bottom front (v6.3.4; was 2t)
// v6.3.2: the fin extends DOWN below p_head_fin_h()'s bottom by this much (top
// unchanged), and its new bottom-front corner is set back, giving a raked
// forefoot below the toe flat.
function p_head_fin_drop()    = 3 * p_wood_t();                          // 36
function p_head_fin_forefoot_setback() = p_head_fin_drop();             // 36: = drop -> 45 deg cut (v6.3.3; was 18)
function p_head_half_lap_engagement() = p_head_slat_overlap() / 2;       // 24
function p_head_slat_reach()  = p_rear_shaft_len() - p_rear_shaft_rear_x();   // 334: bottle base -> slat front
function p_head_slat_len()    = p_head_slat_reach() + p_head_slat_overlap();  // 382
function p_head_slat_width()  = p_rear_shaft_width();                    // 60 == John height
function p_head_slat_hole_from_front() = p_rear_shaft_hole_from_front(); // 113: same reach -> same John pair

// ---- ballast attachment (CLAUDE.md s12) ---------------------
function p_ballast_core_w()   = p_port_height() - 2 * p_wood_t();               // 60 == John height
function p_ballast_core_len() = p_bottle_h() - p_bottle_cap_h() + 6 * p_wood_t();  // 360
function p_ballast_slat_gap() = p_port_height();       // clear inner-face gap
function p_ballast_slat_spacing() = p_port_height() + p_wood_t();               // 96
function p_ballast_board_len() = 3.5 * p_bottle_d() + 2 * p_wood_t();   // 318 (v5.5.0: +2t, 3t ends past the foot slots)
function p_ballast_fin_len()   = 3 * p_bottle_d();     // 246
function p_ballast_lock_w()    = 5 * p_wood_t();       // 60

// ---- neutral wood shades (used when enable_color_coding = false) -------
// With the full colour code off, every wooden subsystem still renders in its
// OWN shade of brown so the parts stay visually separable. All are warm browns
// (R > G > B) spaced by lightness. The two large fins share one darker shade so
// they read as a matched pair, distinct from the rest of their own assembly.
function p_wood_shade_sail()     = [0.85, 0.66, 0.47]; // sail frame  (lightest)
function p_wood_shade_rear_fin() = [0.72, 0.50, 0.33]; // rear-fin shafts + solar holder
function p_wood_shade_eco()      = [0.62, 0.44, 0.28]; // Ecojoiner core
function p_wood_shade_ballast()  = [0.52, 0.34, 0.22]; // ballast slats / board / locks
function p_wood_shade_fin()      = [0.40, 0.26, 0.17]; // rear fin + ballast fin, shared (darkest)
// [bundle] end   <params.scad>

module sail_shaft(round_d          = p_axle_round_d(),
                  round_inside_cap = p_axle_round_inside_cap(),  // 30, roof underside -> round end
                  round_ext        = p_axle_round_ext(),         // 1, proud of the cap face
                  cap_roof_t       = p_cap_roof_t(),              // 5 (TB-03)
                  upper_len        = p_axle_upper_len(),          // 23, continues up through cage + sail bar
                  magnet           = true,
                  magnet_d         = p_magnet_d(),
                  magnet_t         = p_magnet_t(),
                  fn               = undef) {
    nn        = fn == undef ? p_fn_plastic() : fn;
    round_len = round_inside_cap + cap_roof_t + round_ext;
    total_len = upper_len + round_len;

    // ---- interface asserts (inputs from the shared contract) ----
    assert(round_d > 0 && round_d < p_cap_axle_bore_d(),
           "sail_shaft: shaft must clear the cap bore.");
    assert(round_d < p_axle_shaft_hole_d(),
           "sail_shaft: shaft must clear the cage hub / sail bar running hole.");
    assert(round_inside_cap > 0 && cap_roof_t > 0 && round_ext >= 0 && upper_len > 0);
    assert(round_inside_cap > p_cap_boss_depth(),
           "sail_shaft: shaft must pass the boss.");
    assert(round_inside_cap < p_cap_insert_len(),
           "sail_shaft: keep the lower end inside the cap's open insert rim.");
    assert(upper_len + round_ext >
           p_cage_bearing_d() / 2 + p_cage_roof_t() + p_top_crossbar_t(),
           "sail_shaft: shaft must reach through the cage roof and sail bar.");
    assert(!magnet || (magnet_d > 0 && magnet_d < round_d
           && magnet_t > 0 && magnet_t < round_inside_cap));

    $fn = nn;
    difference() {
        cylinder(d = round_d, h = total_len);
        if (magnet)
            translate([0, 0, total_len - magnet_t])
                cylinder(d = magnet_d, h = magnet_t + p_eps());
    }

    echo("SAIL SHAFT: total / round-in-cap / upper length = ", total_len, round_len, upper_len);
    echo("SAIL SHAFT: diameter (uniform, no hex) = ", round_d);
}

// Print pose: either end can sit flat on the bed (a bare cylinder); modelled
// with the upper (cage-lock) end at Z=0 and the magnet opening up, matching
// the as-modelled orientation used before TB-08 -- no reseat module needed.
// [bundle] end   <../../lib/sail_shaft.scad>

color([0.74, 0.77, 0.79])
sail_shaft(round_d          = shaft_diameter,
           round_inside_cap = round_length_inside_cap,
           round_ext        = round_extension_above_cap,
           upper_len        = upper_length,
           magnet           = magnet_recess_enabled,
           magnet_d         = magnet_diameter,
           magnet_t         = magnet_thickness,
           fn               = fn);
